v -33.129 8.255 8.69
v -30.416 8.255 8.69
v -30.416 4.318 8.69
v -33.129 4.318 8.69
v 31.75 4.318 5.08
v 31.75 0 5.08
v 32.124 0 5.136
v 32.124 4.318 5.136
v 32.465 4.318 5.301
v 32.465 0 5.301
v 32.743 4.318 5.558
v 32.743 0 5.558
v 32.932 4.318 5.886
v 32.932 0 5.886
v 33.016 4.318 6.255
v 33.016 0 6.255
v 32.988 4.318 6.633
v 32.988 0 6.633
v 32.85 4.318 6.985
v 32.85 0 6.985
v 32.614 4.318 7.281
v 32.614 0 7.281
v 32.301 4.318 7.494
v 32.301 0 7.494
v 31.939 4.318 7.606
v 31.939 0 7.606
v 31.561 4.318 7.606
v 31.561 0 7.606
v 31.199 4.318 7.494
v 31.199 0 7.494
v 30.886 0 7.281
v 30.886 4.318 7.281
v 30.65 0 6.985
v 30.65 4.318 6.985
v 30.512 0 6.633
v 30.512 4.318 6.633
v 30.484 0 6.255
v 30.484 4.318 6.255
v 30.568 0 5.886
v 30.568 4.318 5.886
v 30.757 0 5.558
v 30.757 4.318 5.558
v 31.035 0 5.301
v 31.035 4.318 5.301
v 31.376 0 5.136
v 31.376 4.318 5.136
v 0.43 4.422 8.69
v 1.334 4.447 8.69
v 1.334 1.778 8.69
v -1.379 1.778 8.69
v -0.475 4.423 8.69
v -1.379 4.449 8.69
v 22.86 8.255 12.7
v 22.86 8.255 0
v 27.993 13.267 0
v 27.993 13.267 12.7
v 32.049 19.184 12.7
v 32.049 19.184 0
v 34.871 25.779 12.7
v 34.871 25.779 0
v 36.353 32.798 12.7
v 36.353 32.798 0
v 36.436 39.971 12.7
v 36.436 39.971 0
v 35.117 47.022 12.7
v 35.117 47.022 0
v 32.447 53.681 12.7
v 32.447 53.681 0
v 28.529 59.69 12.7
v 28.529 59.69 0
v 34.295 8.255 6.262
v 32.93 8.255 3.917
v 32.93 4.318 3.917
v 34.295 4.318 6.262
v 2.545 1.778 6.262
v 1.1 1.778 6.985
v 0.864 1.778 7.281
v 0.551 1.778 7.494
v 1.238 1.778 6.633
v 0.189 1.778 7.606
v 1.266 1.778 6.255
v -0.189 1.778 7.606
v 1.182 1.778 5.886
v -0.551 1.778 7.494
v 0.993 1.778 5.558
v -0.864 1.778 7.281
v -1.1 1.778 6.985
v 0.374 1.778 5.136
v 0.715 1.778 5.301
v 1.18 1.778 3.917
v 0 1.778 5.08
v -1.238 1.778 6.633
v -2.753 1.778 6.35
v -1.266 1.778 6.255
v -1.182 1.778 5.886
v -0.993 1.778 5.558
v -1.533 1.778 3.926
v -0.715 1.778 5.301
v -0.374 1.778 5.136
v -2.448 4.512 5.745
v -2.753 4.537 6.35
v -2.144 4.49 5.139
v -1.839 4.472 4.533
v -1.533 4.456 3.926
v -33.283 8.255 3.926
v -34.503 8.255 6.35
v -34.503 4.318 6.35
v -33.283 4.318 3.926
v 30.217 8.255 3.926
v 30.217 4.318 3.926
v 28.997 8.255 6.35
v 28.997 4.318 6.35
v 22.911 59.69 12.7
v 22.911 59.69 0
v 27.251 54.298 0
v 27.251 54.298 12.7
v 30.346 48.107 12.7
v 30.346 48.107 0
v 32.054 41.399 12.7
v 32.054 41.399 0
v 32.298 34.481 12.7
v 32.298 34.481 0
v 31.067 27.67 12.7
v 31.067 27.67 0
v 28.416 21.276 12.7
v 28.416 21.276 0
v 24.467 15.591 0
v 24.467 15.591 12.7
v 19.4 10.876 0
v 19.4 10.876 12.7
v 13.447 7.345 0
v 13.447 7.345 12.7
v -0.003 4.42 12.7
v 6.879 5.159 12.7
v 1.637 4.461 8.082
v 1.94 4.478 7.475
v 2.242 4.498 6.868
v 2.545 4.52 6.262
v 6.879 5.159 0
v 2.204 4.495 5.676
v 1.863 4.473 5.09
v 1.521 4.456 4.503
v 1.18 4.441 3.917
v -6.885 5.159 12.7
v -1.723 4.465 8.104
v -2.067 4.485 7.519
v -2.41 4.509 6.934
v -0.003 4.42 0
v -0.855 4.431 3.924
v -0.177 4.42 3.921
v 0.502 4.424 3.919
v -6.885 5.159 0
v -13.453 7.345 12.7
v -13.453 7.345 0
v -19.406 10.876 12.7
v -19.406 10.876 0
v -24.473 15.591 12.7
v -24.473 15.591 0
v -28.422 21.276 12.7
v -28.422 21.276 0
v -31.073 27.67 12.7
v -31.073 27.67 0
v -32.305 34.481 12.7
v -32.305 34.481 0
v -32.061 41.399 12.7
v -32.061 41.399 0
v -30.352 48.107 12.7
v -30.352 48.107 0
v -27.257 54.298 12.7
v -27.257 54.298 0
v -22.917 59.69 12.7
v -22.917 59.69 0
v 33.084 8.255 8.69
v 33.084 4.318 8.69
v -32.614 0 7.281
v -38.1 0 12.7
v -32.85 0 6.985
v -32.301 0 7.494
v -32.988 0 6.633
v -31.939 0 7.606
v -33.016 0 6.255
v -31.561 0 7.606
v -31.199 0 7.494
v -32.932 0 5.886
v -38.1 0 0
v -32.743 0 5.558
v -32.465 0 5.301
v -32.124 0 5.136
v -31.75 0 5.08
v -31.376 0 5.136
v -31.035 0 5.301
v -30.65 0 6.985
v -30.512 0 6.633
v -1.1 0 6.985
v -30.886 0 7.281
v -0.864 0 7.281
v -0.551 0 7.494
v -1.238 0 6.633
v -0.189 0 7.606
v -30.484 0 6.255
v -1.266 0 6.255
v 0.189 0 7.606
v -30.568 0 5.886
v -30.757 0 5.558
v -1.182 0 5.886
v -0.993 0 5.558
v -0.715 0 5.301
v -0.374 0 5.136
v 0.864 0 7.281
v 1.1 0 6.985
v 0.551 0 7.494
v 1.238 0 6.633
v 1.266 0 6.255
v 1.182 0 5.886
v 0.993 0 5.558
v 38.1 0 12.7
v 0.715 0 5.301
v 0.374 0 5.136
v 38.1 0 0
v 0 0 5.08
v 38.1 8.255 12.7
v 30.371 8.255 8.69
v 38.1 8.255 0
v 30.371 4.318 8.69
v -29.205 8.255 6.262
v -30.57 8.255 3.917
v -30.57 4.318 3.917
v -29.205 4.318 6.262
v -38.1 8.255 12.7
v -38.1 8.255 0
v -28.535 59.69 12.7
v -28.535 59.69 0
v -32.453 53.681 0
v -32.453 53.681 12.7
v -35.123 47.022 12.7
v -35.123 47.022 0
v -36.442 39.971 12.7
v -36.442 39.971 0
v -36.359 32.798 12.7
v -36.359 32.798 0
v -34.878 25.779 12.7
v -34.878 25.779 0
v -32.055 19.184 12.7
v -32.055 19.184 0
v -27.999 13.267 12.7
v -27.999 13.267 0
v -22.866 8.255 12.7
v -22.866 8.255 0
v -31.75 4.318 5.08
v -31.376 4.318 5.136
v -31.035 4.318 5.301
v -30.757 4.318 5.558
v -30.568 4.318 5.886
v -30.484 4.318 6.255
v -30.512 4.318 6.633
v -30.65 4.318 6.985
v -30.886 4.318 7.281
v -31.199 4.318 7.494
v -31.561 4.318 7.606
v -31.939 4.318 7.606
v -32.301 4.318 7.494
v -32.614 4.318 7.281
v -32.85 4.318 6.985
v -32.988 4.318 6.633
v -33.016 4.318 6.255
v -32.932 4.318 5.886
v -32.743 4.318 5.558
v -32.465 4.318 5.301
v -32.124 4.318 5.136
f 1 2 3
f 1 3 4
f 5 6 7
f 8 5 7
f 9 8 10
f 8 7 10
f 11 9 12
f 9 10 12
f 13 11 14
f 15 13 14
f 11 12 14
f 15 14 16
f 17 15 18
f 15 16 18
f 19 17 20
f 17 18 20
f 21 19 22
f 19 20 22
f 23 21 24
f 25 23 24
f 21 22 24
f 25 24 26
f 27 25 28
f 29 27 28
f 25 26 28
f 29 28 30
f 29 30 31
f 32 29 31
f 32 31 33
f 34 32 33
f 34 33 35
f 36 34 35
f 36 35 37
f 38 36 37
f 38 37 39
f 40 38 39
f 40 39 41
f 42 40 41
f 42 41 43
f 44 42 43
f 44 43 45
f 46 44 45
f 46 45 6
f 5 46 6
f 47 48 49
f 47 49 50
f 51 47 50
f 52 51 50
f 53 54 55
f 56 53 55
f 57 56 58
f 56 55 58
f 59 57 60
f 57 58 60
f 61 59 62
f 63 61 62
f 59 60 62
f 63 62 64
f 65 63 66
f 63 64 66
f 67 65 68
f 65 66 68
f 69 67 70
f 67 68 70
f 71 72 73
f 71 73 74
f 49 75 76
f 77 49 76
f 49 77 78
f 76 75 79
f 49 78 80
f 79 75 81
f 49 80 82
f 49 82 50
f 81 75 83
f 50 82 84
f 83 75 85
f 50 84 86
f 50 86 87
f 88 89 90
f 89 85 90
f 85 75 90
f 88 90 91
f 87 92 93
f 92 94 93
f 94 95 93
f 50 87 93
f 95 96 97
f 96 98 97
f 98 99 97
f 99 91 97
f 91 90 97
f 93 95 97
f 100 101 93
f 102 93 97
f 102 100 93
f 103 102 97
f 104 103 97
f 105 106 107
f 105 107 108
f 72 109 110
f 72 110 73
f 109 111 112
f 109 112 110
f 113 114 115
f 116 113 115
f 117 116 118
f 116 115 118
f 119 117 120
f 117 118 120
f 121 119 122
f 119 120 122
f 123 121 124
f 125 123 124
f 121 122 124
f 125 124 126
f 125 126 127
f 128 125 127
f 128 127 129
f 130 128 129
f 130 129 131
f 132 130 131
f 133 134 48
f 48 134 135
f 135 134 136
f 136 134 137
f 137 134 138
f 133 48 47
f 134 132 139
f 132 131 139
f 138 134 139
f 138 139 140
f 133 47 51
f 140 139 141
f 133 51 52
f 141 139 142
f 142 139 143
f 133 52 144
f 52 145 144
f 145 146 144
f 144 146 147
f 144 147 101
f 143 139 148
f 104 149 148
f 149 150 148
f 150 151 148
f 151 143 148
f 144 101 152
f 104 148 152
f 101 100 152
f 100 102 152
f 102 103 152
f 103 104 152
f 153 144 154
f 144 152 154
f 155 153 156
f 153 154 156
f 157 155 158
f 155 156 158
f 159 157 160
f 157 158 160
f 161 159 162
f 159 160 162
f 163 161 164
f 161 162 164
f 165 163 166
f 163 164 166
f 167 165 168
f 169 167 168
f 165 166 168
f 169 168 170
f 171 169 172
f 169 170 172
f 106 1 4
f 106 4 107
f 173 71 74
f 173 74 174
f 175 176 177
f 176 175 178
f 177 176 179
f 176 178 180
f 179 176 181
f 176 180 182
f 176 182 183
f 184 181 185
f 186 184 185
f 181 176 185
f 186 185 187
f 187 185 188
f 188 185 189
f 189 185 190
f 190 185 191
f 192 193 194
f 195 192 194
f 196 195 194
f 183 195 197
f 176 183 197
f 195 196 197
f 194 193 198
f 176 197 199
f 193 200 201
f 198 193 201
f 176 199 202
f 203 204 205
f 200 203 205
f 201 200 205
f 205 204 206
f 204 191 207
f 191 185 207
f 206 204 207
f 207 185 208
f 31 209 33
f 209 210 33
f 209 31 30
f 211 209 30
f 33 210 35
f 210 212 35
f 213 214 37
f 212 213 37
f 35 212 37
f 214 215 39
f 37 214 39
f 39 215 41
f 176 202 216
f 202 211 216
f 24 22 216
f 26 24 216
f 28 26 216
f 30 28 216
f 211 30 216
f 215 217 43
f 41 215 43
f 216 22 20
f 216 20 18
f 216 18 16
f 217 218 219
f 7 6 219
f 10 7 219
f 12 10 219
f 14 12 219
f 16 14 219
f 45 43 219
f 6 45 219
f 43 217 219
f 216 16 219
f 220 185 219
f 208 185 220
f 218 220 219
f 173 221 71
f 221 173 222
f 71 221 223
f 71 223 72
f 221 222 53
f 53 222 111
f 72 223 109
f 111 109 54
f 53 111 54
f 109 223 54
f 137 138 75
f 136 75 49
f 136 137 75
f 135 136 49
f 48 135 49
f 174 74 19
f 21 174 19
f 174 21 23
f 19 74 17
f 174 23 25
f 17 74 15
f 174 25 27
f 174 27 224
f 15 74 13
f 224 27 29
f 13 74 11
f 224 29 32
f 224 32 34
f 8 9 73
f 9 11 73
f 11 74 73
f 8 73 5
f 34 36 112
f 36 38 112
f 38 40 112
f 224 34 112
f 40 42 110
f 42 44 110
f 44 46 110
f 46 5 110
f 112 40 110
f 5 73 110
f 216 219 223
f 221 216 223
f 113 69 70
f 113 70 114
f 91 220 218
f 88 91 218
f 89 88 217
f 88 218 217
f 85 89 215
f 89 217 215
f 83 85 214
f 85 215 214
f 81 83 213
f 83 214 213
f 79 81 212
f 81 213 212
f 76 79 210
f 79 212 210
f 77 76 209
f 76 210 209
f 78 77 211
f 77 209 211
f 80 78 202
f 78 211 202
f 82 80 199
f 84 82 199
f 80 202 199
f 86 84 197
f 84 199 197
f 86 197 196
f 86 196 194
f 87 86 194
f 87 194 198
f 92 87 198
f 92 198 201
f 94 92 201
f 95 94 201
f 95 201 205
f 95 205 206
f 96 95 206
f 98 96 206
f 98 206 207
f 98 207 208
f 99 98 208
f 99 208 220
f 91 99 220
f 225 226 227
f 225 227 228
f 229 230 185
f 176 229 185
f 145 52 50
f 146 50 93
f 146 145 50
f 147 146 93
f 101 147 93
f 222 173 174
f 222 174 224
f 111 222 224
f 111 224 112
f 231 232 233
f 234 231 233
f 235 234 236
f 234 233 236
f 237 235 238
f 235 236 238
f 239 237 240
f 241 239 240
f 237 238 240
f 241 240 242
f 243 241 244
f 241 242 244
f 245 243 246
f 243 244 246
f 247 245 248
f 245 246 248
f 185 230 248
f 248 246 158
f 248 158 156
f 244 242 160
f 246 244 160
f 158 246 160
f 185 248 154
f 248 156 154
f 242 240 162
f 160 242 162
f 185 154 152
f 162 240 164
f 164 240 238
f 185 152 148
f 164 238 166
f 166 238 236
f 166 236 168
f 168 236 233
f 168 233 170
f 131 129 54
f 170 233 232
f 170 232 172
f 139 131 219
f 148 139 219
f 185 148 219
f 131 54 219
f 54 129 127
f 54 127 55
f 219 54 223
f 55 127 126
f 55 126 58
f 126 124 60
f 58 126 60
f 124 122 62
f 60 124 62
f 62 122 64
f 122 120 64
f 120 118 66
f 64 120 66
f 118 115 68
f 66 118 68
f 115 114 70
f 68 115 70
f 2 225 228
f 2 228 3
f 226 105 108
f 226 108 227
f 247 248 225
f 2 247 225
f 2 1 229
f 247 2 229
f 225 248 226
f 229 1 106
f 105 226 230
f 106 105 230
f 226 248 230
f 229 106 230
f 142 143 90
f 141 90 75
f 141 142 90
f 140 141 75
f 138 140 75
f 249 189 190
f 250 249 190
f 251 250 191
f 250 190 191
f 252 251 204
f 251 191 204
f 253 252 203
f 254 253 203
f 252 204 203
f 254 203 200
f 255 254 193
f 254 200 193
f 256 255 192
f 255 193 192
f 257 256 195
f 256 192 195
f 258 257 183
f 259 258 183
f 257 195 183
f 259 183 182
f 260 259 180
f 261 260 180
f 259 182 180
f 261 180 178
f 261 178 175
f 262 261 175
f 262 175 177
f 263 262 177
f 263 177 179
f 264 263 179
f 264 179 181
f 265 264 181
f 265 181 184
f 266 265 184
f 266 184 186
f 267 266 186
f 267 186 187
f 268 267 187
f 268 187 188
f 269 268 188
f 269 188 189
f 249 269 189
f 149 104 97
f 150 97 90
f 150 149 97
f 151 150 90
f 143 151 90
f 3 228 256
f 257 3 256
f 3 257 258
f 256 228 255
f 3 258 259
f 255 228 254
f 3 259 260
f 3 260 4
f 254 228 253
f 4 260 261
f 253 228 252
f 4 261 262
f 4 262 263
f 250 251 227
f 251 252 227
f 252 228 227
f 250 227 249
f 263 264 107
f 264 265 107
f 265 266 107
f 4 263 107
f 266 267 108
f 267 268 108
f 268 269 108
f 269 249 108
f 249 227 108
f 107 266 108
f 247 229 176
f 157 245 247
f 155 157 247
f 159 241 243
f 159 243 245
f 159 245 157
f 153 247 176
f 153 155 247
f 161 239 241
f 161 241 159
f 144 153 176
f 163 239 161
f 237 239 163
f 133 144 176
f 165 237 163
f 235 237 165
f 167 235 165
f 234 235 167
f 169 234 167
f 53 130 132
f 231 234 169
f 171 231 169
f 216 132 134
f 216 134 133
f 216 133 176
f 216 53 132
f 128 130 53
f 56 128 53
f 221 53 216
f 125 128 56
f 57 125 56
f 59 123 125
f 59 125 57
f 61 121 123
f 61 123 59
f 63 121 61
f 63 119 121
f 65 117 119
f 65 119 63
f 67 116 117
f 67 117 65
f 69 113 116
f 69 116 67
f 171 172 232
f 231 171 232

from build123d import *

# Parameters (mm, degrees)
BOSS_EXTRUDE1_DEPTH = 12.7
SKETCH3_R           = 1.27
CUT_EXTRUDE1_DEPTH  = 12.7
CUT_EXTRUDE2_DEPTH  = 3.937
LPATTERN1_COUNT     = 3
LPATTERN1_PITCH     = 31.75
CUT_EXTRUDE3_DEPTH  = 2.54


with BuildPart() as part:
    # Sketch2 → Boss-Extrude1 (new body)
    with BuildSketch(Plane.XY):
        with BuildLine():
            Line((0, 0), (38.1, 0))
            Line((38.1, 0), (38.1, 8.255))
            Line((38.1, 8.255), (22.86, 8.255))
            ThreePointArc((22.86, 8.255), (36.352714712, 32.797844463), (28.528615071, 59.69))
            Line((28.528615071, 59.69), (22.910736376, 59.69))
            ThreePointArc((22.910736376, 59.69), (-0.00316084, 4.419599864), (-22.917058056, 59.69))
            Line((-22.917058056, 59.69), (-28.534936751, 59.69))
            ThreePointArc((-28.534936751, 59.69), (-36.359036392, 32.797844463), (-22.86632168, 8.255))
            Line((-22.86632168, 8.255), (-38.1, 8.255))
            Line((-38.1, 8.255), (-38.1, 0))
            Line((-38.1, 0), (0, 0))
        make_face()
    extrude(amount=BOSS_EXTRUDE1_DEPTH)

    # Sketch3 → Cut-Extrude1 (cut)
    with BuildSketch(Plane.XZ):
        with Locations(Location((0, 6.35, 0), (0, 0, 270))):
            Circle(SKETCH3_R)
        with Locations(Location((31.75, 6.35, 0), (0, 0, 270))):
            Circle(SKETCH3_R)
        with Locations(Location((-31.75, 6.35, 0), (0, 0, 270))):
            Circle(SKETCH3_R)
    extrude(amount=-CUT_EXTRUDE1_DEPTH, mode=Mode.SUBTRACT)

    # Sketch4 → Cut-Extrude2 (cut)
    with BuildSketch(Plane(origin=(0, 8.255, 0), x_dir=(1, 0, 0), z_dir=(0, 1, 0))):
        Polygon((-30.415911199, -8.690045044), (-33.129332156, -8.690045044), (-34.502956004, -6.35), (-33.28343783, -3.926071637), (-30.570033405, -3.91660003), (-29.20512854, -6.26174139), align=None)
    cut_extrude2 = extrude(amount=-CUT_EXTRUDE2_DEPTH, mode=Mode.SUBTRACT)

    # LPattern1: Cut-Extrude2 ×3
    with Locations(*[(i * LPATTERN1_PITCH, 0, 0) for i in range(1, LPATTERN1_COUNT)]):
        add(cut_extrude2, mode=Mode.SUBTRACT)

    # Sketch6 → Cut-Extrude3 (cut)
    with BuildSketch(Plane(origin=(0, 4.318, 0), x_dir=(1, 0, 0), z_dir=(0, 1, 0))):
        Polygon((1.334088801, -8.690045044), (-1.379332156, -8.690045044), (-2.752956004, -6.35), (-1.53343783, -3.926071637), (1.179966595, -3.91660003), (2.54487146, -6.26174139), align=None)
    extrude(amount=-CUT_EXTRUDE3_DEPTH, mode=Mode.SUBTRACT)


solid = part.part
